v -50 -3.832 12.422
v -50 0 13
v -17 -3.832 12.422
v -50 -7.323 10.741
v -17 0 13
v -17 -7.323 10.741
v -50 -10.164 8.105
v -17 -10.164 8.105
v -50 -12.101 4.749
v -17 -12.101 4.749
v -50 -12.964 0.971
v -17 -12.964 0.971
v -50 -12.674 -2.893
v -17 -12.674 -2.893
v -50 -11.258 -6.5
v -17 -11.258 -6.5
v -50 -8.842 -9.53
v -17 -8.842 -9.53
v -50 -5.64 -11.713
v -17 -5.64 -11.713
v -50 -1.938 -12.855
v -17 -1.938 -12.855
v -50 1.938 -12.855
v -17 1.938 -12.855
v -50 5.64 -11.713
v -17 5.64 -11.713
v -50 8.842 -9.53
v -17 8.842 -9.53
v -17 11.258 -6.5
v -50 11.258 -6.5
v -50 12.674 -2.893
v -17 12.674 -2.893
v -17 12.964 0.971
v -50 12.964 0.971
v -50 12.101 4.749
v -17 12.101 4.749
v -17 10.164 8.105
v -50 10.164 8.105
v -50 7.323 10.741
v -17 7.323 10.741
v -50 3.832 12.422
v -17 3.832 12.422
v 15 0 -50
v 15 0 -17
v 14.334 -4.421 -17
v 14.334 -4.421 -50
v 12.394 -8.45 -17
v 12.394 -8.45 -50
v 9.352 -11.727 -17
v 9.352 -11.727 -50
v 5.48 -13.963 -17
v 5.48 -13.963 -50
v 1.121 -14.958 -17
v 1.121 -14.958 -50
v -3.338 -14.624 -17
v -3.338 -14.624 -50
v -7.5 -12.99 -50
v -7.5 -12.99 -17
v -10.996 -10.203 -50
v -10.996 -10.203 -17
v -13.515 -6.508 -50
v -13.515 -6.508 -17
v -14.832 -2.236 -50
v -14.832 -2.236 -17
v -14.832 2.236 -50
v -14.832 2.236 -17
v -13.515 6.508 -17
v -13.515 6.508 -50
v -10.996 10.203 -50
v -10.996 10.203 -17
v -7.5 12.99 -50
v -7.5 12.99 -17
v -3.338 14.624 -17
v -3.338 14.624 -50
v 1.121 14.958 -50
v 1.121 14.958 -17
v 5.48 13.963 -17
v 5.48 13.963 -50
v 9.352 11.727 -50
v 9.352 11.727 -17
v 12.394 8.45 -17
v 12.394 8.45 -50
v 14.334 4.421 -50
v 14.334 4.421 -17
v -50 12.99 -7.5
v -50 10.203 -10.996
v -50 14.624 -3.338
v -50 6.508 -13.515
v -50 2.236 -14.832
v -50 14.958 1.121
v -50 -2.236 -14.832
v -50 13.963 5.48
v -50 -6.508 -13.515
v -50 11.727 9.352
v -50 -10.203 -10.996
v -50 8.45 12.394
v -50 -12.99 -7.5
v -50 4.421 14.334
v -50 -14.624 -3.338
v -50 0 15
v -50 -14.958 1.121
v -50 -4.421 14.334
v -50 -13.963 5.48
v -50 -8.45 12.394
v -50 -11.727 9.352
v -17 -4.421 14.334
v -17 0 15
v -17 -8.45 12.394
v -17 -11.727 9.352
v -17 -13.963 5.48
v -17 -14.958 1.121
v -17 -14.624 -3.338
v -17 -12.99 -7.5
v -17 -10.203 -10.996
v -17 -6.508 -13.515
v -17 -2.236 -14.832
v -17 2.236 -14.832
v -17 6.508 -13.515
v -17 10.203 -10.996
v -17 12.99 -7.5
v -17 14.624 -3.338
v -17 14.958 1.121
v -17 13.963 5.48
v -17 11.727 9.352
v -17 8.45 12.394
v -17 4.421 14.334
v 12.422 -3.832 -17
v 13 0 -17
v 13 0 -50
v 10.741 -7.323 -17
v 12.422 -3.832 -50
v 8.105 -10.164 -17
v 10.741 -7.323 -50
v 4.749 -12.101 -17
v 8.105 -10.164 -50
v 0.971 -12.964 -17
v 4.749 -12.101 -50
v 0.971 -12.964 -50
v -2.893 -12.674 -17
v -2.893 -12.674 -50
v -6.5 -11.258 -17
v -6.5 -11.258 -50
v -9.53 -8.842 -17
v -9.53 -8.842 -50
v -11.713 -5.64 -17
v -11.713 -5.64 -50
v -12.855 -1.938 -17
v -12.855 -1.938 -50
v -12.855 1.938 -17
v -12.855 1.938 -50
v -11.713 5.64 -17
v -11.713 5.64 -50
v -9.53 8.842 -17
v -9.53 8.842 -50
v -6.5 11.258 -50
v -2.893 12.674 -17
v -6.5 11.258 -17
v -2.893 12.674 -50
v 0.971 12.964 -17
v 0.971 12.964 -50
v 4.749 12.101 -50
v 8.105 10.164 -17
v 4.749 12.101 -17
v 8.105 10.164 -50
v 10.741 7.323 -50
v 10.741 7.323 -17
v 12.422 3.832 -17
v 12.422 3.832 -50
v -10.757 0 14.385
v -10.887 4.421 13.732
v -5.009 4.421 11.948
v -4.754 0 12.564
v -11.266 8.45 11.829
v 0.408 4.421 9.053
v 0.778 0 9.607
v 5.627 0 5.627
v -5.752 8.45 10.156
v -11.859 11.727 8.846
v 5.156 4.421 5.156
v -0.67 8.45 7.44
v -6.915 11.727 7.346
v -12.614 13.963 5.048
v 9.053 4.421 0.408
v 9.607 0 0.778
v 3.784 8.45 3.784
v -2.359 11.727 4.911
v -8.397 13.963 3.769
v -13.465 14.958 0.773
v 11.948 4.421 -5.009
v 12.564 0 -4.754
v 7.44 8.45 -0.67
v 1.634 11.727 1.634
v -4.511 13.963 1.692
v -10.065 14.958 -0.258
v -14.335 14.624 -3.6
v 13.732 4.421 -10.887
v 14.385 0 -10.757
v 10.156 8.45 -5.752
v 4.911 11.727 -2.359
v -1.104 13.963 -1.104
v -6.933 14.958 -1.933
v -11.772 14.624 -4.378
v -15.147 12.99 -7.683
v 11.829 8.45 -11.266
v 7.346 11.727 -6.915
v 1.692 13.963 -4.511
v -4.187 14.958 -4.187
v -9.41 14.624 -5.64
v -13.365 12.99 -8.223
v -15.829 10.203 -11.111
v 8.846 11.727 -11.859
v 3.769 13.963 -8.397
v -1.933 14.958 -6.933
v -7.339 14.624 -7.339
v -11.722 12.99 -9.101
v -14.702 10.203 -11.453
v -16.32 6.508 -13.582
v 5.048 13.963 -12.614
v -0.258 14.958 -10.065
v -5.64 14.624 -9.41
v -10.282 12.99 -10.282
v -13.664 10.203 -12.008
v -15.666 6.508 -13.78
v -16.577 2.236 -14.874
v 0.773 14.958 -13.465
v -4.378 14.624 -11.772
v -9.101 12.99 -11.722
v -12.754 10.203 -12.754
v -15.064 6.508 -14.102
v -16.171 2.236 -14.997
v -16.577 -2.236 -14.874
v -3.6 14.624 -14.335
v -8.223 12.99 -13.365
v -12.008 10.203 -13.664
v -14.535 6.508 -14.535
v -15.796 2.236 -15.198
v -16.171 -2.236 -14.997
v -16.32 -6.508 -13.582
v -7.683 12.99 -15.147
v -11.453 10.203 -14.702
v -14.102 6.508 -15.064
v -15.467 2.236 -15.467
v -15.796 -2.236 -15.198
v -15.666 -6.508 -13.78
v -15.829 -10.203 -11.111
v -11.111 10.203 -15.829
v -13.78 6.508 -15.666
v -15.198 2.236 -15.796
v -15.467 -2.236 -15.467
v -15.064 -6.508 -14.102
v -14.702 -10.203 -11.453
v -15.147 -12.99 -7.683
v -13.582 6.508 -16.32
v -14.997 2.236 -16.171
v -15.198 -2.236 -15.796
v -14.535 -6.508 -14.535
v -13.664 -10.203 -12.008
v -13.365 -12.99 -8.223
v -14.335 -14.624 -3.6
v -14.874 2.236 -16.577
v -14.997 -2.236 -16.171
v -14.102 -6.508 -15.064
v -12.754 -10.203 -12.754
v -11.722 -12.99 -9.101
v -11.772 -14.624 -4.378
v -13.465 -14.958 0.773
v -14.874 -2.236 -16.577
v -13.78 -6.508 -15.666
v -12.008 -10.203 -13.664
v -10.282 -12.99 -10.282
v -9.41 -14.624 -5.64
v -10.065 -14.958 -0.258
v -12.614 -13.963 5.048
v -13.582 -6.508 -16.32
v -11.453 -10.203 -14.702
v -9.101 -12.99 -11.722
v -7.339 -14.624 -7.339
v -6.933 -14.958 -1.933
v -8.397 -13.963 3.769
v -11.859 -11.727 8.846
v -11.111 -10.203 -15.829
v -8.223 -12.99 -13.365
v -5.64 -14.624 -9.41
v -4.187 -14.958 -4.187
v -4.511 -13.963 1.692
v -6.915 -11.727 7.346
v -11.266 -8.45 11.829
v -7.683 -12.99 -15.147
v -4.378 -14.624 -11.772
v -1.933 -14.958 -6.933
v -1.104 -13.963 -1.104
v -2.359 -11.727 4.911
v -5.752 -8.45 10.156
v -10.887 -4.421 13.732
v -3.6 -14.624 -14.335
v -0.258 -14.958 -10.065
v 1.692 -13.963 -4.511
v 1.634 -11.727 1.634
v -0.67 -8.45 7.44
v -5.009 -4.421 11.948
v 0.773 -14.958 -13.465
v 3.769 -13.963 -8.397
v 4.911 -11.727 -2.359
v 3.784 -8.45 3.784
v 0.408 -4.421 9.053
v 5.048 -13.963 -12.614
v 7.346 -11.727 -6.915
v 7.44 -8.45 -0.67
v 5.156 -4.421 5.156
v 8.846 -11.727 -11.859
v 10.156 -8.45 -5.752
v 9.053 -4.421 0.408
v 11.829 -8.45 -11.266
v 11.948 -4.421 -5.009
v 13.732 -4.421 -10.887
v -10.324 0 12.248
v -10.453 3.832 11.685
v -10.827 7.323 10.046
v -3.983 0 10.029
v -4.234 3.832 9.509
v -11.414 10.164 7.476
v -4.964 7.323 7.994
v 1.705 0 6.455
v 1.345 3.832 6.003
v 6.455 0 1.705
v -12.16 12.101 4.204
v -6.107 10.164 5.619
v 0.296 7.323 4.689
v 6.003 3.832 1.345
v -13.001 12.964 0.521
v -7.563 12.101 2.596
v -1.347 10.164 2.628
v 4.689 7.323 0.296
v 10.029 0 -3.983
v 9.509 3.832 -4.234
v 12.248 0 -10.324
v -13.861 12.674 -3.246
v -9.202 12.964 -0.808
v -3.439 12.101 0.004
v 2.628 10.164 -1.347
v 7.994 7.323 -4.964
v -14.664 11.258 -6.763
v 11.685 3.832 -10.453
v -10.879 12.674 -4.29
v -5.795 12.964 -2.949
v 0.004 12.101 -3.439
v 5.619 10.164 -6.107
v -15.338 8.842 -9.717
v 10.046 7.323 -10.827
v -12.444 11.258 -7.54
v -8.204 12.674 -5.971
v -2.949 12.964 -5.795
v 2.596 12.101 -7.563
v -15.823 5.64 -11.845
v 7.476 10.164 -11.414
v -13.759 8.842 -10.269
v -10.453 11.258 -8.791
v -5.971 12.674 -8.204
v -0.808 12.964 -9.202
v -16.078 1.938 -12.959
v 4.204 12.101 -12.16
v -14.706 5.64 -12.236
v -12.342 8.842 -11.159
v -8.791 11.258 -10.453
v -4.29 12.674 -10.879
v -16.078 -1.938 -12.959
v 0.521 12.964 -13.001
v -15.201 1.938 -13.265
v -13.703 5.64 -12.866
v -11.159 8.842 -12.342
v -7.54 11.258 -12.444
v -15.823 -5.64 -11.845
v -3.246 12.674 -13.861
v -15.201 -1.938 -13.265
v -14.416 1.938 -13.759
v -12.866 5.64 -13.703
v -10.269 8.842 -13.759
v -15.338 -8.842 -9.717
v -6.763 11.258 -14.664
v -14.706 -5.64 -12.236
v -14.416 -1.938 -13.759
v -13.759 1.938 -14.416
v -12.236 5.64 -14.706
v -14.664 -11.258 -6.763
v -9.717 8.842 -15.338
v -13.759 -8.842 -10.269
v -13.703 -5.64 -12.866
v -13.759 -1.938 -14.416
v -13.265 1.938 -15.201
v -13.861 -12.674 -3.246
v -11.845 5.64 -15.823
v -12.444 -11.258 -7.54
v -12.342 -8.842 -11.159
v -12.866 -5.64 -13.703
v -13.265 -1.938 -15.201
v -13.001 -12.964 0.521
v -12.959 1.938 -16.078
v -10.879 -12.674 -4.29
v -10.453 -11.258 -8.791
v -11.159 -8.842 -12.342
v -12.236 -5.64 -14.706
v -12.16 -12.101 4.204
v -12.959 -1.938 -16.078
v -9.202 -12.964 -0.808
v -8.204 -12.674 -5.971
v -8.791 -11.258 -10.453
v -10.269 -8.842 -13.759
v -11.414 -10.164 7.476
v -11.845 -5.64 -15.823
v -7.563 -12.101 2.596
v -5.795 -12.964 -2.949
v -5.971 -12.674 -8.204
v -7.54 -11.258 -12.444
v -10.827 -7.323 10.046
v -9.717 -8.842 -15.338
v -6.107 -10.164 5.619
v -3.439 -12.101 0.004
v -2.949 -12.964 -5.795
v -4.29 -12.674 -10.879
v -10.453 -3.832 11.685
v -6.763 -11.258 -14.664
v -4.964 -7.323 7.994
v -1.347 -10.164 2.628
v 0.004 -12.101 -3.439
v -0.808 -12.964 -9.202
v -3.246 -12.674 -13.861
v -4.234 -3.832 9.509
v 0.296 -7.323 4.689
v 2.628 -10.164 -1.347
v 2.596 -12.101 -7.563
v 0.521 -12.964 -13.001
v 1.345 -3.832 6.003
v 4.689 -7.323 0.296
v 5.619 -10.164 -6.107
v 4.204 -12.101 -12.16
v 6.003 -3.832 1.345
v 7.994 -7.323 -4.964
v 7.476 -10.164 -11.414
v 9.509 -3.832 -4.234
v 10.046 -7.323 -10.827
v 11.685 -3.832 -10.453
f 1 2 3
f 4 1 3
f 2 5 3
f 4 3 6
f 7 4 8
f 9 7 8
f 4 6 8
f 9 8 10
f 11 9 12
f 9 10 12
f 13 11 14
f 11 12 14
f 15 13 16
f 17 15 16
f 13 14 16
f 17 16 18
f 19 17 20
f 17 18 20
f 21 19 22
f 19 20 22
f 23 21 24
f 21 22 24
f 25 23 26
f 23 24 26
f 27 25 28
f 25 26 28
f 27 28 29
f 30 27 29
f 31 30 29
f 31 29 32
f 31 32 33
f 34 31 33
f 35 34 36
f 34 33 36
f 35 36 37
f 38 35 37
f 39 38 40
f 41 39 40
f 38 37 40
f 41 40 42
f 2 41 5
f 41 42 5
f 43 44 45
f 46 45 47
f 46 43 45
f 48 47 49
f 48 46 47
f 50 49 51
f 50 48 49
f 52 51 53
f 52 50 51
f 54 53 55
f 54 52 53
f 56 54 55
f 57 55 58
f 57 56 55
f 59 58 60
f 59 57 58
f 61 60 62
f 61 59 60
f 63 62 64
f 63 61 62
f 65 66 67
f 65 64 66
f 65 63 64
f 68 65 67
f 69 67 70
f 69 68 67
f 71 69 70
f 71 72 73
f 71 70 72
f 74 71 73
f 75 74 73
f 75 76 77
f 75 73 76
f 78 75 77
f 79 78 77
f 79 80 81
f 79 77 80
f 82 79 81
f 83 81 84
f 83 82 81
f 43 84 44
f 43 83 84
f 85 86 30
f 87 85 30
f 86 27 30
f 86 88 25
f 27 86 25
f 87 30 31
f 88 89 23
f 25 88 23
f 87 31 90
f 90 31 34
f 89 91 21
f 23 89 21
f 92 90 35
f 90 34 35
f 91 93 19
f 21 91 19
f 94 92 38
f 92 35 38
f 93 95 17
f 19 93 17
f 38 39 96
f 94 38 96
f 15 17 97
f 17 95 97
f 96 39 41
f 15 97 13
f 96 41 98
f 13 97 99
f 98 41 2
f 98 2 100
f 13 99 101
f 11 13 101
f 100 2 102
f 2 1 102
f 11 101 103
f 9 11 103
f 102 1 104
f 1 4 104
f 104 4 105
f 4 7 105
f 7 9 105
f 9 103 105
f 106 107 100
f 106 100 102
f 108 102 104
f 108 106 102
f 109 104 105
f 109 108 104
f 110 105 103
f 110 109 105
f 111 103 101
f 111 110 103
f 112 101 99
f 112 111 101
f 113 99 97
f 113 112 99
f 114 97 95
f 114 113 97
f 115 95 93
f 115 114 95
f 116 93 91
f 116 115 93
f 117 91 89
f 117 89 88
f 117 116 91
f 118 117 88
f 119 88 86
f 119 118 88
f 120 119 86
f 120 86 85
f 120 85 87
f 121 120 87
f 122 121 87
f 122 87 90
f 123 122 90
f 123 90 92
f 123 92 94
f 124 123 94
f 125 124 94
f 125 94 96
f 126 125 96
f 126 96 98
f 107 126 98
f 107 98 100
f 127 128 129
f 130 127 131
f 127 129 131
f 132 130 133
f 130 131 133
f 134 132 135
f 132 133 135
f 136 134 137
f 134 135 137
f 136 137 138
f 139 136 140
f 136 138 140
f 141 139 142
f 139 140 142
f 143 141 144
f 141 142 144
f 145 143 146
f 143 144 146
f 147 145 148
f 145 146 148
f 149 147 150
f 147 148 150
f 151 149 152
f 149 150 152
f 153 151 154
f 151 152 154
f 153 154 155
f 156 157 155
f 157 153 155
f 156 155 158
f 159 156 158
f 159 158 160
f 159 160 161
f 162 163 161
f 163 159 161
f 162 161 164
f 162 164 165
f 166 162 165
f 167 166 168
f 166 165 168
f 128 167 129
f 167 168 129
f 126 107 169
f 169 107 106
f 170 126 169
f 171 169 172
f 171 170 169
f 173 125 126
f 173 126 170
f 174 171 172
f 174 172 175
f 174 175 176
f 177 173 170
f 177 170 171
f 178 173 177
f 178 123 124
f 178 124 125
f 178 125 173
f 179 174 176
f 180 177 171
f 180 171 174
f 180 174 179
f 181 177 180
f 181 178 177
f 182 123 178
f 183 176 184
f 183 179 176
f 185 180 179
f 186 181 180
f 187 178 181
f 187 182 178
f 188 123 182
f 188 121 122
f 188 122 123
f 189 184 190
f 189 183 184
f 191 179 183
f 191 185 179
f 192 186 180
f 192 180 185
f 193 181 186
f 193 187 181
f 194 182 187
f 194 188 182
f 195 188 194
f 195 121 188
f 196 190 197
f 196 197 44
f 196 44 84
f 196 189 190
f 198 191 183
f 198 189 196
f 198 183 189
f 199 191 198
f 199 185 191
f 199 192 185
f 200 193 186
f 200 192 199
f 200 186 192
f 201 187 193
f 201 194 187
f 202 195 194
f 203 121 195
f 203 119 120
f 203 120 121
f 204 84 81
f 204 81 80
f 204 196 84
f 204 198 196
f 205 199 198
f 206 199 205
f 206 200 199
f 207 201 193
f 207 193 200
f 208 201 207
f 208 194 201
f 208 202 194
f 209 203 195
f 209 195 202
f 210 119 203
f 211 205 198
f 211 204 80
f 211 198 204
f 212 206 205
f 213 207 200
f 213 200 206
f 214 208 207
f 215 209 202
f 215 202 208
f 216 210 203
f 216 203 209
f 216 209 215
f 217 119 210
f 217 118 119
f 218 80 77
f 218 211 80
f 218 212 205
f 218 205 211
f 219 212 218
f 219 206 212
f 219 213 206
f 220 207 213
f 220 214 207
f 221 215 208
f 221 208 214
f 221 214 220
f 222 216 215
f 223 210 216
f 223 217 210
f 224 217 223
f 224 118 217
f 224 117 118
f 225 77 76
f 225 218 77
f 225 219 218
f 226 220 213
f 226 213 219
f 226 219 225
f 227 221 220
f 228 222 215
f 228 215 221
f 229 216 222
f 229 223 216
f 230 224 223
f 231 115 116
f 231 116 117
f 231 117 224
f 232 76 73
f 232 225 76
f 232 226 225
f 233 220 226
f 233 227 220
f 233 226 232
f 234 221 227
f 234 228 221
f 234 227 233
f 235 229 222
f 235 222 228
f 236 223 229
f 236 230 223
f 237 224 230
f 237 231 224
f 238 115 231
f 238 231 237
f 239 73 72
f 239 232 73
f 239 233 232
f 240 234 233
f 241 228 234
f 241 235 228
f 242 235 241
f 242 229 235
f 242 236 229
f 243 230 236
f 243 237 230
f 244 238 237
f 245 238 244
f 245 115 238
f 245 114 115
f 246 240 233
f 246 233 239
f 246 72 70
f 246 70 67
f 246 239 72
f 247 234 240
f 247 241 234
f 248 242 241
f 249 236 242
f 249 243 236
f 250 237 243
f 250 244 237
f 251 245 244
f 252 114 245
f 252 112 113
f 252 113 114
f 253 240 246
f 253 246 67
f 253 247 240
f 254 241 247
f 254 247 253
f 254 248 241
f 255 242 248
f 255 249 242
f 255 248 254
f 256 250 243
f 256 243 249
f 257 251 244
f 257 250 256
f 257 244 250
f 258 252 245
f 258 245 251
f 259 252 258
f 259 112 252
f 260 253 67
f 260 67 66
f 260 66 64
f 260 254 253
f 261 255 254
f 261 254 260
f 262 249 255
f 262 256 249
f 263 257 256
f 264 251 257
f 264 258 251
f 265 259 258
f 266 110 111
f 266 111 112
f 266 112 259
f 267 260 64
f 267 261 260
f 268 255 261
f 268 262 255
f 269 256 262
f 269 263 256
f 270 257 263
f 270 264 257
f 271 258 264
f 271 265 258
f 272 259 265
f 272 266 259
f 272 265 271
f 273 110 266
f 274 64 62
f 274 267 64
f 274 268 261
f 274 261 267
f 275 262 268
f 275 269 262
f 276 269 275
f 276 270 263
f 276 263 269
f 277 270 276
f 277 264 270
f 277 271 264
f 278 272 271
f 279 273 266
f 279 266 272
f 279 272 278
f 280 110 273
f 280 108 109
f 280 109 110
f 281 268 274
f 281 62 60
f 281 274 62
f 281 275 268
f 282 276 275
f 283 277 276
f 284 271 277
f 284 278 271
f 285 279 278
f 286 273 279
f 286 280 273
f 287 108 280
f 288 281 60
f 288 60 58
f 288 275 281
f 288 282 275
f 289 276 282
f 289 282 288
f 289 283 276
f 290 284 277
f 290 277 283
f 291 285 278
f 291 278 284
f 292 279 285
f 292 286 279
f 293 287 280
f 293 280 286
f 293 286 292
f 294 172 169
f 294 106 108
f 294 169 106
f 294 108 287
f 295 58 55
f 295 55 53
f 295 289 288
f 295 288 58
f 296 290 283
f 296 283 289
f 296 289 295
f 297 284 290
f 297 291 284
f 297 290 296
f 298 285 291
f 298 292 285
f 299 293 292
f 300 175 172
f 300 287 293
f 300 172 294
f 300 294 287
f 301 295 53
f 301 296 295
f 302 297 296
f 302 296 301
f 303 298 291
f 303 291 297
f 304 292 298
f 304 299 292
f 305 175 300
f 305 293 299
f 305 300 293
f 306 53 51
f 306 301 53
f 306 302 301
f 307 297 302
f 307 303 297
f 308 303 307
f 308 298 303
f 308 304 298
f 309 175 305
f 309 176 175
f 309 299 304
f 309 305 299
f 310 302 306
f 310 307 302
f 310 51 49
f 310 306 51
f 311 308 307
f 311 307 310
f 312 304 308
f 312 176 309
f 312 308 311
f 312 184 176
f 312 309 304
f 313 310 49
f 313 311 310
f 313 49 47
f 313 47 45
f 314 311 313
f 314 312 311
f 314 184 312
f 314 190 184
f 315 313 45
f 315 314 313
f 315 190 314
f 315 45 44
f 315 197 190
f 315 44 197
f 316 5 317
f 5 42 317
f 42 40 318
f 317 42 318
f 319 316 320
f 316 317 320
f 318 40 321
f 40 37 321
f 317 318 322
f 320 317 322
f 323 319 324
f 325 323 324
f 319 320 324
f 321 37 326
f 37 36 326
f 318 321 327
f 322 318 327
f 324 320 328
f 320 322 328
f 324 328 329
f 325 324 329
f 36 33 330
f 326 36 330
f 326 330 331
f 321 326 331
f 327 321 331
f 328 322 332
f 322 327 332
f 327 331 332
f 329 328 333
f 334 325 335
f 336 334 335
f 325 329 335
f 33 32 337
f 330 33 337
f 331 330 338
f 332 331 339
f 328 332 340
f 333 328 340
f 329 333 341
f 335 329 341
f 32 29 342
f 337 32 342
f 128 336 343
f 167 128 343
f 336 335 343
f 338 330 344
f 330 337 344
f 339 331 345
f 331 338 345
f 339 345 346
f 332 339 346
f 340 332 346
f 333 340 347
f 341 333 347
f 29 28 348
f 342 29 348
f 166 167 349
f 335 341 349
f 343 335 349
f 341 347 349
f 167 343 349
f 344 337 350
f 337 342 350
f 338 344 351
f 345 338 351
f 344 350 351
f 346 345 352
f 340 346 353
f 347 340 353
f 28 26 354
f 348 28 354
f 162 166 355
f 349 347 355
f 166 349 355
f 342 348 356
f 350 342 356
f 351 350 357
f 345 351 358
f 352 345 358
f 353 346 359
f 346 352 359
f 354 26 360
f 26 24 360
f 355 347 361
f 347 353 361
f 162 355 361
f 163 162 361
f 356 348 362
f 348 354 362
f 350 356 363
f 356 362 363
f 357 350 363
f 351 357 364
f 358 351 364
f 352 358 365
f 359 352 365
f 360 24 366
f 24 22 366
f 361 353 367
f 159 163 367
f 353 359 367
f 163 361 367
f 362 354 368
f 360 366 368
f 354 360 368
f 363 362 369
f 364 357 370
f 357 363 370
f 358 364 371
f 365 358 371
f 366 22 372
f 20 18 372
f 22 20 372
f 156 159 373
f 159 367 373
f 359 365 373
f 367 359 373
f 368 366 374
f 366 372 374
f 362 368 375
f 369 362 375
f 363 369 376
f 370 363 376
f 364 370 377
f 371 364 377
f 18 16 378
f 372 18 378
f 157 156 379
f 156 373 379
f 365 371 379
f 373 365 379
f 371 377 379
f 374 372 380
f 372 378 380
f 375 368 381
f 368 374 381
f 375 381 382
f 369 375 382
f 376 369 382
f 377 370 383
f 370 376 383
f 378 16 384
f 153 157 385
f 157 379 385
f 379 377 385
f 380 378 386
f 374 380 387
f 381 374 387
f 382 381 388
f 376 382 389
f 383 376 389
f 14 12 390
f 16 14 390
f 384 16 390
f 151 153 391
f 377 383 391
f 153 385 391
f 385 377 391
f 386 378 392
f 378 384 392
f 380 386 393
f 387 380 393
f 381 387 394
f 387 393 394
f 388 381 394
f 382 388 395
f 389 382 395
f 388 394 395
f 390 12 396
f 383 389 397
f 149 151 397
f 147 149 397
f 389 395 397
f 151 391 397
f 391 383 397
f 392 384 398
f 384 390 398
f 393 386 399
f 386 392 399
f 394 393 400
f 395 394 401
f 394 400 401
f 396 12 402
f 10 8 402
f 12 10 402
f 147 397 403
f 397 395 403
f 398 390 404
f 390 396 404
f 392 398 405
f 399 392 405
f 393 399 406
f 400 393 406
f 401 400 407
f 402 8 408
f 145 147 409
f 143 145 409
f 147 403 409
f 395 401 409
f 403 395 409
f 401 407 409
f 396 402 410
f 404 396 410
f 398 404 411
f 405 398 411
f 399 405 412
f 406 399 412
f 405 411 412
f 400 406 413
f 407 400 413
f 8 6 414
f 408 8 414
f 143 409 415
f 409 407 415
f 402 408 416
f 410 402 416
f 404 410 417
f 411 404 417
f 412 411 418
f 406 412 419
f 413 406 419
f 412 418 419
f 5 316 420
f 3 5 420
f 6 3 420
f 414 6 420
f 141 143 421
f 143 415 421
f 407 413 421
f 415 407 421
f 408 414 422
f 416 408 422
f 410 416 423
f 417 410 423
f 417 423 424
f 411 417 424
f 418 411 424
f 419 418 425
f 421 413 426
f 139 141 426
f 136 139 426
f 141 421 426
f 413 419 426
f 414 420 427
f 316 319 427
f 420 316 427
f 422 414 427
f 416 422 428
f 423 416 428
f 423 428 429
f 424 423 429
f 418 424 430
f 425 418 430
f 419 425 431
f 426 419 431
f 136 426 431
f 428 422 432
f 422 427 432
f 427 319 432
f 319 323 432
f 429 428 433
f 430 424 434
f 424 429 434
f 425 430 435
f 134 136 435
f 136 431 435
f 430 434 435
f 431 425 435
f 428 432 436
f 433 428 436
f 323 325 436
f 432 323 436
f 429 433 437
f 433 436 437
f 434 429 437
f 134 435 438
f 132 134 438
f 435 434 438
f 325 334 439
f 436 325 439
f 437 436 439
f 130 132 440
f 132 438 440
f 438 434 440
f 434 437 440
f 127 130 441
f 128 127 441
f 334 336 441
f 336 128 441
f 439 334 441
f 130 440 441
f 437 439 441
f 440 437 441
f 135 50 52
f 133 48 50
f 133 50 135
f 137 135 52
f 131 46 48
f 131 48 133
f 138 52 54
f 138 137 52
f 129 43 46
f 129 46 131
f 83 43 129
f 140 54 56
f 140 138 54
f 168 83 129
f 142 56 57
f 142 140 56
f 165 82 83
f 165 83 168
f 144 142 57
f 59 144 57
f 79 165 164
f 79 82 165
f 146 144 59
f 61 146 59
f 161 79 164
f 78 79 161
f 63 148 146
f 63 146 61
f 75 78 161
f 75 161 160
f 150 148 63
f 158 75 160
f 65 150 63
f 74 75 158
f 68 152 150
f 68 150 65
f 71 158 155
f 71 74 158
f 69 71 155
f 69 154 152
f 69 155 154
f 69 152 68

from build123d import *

# Parameters (mm, degrees)
SWEEP1_PROFILE_R = 15
SHELL1_T         = -2


with BuildPart() as part:
    # Sweep1: sweep along a path in Sketch1
    with BuildLine(Plane(origin=(0, 0, 0), x_dir=(1, 0, 0), z_dir=(0, 1, 0))) as sweep1_path:
        Line((-50, 0), (-17, 0))
        ThreePointArc((-17, 0), (-4.97918472, 4.97918472), (0, 17))
        Line((0, 17), (0, 50))
    # Sweep1 profile (on start of the path) → Sweep1 (sweep)
    with BuildSketch(Plane(origin=(-50, 0, 0), x_dir=(0, 0, 1), z_dir=(1, 0, 0))):
        Circle(SWEEP1_PROFILE_R)
    sweep(path=sweep1_path.line)

    # Shell1
    shell1_openings = [part.faces().sort_by_distance(p)[0] for p in [
        (0, 0, -50),
        (-50, 0, 0),
    ]]
    offset(amount=SHELL1_T, openings=shell1_openings, kind=Kind.INTERSECTION)


solid = part.part
